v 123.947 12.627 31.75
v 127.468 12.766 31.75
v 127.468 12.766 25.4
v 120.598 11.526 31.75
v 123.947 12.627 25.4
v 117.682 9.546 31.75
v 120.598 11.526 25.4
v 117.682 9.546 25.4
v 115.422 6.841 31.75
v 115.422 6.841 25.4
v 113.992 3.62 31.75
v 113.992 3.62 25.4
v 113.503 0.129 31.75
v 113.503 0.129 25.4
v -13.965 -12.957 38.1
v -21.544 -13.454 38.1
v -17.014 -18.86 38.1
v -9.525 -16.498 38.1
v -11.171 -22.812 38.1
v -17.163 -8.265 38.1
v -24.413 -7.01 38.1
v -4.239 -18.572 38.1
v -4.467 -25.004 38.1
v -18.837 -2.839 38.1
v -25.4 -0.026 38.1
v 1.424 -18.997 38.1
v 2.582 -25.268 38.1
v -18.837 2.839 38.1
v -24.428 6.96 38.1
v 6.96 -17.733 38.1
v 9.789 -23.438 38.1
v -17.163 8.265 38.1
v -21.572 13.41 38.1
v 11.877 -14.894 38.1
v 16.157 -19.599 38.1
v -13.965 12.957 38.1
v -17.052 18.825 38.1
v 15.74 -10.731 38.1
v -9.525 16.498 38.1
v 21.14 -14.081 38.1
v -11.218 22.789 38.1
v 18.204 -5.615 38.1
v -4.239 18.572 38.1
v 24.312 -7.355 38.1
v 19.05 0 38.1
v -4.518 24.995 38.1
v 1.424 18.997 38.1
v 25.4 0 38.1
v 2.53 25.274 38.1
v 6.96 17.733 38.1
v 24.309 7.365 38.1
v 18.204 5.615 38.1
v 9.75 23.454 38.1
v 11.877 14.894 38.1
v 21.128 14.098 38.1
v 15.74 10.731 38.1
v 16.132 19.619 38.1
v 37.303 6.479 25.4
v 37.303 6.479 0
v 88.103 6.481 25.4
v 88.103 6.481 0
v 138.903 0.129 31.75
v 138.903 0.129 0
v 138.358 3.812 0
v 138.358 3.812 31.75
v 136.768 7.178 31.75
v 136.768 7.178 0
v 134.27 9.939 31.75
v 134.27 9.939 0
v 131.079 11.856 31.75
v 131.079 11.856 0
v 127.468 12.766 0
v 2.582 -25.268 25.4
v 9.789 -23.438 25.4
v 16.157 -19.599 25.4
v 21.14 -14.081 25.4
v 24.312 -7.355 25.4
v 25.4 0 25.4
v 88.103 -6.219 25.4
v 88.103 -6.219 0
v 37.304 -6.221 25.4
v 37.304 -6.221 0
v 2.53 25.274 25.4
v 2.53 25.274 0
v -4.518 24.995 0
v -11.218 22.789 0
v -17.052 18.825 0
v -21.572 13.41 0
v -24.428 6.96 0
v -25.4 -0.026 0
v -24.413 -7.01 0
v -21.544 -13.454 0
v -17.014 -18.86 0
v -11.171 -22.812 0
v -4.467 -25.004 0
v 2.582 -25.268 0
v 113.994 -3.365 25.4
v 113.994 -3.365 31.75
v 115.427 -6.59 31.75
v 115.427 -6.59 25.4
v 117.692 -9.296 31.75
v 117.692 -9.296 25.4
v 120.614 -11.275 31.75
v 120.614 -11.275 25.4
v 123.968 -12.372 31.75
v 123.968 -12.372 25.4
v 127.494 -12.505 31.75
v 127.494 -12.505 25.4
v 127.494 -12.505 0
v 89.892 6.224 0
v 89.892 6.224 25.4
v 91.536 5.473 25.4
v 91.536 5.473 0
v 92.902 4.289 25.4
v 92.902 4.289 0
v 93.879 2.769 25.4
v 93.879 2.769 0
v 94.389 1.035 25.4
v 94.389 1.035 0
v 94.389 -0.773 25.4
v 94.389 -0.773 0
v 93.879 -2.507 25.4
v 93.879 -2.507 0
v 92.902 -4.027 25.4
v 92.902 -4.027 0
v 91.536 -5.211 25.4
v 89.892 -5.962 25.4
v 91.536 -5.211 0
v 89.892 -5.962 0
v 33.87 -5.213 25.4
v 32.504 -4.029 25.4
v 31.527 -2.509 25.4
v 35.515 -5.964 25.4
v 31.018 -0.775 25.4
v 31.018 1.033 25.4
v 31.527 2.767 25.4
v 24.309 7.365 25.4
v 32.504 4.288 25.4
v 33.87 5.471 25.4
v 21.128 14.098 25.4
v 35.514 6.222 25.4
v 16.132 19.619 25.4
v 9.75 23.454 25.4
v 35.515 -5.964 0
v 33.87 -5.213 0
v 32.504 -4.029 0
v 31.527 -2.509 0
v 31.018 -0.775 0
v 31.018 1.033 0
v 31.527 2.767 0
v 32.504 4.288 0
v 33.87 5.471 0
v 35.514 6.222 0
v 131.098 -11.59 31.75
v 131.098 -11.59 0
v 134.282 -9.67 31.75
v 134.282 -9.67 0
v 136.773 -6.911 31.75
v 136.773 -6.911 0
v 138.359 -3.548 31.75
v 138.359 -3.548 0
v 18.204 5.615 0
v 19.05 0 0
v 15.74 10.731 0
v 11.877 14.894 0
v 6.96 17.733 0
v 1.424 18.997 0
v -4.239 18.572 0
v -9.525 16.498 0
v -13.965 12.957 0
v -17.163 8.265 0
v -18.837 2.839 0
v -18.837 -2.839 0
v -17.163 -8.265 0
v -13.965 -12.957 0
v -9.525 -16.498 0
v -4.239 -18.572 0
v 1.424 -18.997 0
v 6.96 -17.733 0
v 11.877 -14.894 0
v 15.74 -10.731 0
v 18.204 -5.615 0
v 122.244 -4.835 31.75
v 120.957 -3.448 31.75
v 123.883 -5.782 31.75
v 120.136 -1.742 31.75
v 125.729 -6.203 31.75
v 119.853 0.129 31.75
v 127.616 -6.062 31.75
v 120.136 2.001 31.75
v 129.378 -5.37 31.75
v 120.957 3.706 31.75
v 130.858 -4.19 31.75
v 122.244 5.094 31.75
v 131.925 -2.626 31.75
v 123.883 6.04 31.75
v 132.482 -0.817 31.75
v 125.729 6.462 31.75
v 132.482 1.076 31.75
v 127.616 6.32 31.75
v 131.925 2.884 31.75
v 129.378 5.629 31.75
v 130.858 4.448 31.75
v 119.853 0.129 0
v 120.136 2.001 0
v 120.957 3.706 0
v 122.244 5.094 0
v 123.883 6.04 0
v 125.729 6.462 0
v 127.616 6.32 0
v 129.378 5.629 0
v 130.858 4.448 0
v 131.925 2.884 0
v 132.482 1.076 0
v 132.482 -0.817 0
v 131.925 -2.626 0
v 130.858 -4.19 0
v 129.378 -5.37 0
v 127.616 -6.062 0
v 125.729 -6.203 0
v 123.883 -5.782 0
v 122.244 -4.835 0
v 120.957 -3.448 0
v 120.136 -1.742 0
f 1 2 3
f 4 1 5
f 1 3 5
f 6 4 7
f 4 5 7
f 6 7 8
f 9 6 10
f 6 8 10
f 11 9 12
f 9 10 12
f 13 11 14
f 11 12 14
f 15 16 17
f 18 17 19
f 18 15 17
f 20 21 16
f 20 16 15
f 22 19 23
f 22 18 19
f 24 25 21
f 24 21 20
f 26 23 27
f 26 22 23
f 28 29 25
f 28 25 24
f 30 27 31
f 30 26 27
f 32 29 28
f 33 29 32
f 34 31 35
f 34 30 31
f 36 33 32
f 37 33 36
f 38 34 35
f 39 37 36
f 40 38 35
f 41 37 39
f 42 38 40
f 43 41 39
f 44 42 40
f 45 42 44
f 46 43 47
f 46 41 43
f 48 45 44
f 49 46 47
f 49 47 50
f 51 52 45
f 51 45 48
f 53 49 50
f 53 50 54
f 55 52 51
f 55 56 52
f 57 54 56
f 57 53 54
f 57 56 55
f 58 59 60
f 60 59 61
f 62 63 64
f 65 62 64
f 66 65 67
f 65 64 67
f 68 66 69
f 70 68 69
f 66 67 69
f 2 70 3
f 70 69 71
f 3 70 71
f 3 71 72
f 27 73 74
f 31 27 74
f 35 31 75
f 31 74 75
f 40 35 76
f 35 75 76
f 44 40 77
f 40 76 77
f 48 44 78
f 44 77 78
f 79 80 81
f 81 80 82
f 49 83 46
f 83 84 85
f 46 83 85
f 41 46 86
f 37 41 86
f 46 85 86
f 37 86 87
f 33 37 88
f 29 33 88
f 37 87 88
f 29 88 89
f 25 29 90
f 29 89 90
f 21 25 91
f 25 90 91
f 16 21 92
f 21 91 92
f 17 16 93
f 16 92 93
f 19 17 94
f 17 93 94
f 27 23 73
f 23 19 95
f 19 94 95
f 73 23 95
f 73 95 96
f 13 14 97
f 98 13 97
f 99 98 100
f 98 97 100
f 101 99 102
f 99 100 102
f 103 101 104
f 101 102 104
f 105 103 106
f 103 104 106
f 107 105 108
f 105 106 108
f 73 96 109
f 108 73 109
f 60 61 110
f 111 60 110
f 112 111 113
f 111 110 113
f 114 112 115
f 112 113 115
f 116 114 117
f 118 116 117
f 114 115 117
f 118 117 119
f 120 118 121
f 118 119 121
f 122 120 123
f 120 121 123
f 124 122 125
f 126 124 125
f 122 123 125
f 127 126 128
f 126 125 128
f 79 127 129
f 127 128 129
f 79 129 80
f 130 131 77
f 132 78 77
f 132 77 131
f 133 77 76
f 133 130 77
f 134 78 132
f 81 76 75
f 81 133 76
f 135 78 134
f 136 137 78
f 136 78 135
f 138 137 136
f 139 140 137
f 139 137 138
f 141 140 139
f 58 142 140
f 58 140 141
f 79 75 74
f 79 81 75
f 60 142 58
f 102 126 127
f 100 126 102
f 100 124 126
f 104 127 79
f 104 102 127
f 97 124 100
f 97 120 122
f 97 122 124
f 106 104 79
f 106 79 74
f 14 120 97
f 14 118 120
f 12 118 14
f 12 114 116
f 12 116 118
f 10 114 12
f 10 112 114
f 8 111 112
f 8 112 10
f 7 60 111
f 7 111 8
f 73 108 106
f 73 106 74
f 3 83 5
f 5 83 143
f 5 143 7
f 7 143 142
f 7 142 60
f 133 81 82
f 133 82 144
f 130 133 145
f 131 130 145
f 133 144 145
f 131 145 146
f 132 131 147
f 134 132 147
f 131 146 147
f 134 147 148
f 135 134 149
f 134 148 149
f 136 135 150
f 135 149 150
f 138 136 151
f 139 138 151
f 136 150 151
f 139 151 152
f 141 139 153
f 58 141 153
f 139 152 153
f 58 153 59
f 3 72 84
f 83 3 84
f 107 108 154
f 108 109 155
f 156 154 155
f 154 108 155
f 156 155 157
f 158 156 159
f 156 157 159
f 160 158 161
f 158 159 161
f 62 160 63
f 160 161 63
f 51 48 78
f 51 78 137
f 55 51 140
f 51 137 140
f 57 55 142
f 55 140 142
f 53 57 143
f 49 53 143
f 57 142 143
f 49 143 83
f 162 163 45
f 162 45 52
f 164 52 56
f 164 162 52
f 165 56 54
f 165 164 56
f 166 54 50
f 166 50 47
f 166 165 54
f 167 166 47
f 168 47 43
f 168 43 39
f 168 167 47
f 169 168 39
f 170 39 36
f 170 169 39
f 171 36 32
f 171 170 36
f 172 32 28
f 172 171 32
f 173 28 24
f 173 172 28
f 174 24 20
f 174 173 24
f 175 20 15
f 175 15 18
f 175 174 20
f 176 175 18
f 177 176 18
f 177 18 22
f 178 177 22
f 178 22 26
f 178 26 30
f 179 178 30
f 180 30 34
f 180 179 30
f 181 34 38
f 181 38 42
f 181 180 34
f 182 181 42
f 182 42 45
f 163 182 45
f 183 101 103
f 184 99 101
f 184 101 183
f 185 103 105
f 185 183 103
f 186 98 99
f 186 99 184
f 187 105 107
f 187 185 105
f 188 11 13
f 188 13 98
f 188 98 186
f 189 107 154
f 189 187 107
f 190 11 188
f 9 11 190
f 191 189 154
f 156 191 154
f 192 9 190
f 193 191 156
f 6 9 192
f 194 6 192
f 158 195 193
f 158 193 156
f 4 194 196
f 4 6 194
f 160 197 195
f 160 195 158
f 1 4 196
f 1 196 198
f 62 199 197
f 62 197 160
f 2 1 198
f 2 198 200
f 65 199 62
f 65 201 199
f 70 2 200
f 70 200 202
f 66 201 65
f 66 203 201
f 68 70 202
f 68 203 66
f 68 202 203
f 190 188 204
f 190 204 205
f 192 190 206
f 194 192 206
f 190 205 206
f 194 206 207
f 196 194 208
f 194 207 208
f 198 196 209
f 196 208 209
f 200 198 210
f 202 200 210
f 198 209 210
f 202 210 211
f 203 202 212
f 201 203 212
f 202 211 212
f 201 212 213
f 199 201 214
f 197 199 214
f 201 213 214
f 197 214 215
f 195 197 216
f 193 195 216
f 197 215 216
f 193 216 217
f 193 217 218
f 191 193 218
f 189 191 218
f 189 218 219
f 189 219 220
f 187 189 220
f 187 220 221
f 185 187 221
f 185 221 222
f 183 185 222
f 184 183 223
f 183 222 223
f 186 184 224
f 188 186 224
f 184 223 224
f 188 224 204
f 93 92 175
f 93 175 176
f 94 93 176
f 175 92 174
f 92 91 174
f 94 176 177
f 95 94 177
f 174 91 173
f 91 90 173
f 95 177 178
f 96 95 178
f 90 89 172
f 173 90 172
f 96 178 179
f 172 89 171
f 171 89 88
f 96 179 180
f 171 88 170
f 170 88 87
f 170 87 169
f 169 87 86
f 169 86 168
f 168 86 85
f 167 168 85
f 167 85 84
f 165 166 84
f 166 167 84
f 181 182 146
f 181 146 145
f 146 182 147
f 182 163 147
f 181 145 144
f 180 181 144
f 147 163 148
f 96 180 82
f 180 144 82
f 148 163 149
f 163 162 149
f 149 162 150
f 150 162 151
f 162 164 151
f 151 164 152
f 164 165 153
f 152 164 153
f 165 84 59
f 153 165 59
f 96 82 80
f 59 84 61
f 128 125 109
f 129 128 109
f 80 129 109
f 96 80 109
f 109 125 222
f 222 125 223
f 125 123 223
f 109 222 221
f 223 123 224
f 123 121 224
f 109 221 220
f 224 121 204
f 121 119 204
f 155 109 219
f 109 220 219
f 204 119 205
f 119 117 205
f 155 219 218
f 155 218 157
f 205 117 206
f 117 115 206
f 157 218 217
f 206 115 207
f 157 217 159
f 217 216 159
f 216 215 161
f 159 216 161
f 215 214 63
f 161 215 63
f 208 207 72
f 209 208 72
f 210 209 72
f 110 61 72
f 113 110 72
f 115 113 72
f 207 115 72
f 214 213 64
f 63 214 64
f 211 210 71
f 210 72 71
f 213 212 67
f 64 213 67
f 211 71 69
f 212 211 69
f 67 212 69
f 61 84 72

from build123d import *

# Parameters (mm, degrees)
F0_R     = 19.05
F1_DEPTH = 38.1
F2_DEPTH = 25.4
F3_DEPTH = 31.75


with BuildPart() as f1:
    # F0 (on Top) → F1 (new body)
    with BuildSketch(Plane.XY):
        with BuildLine():
            ThreePointArc((2.581912, -25.268433), (18.851268, -17.023211), (25.4, 0))
            ThreePointArc((25.4, 0), (18.833823, 17.042509), (2.530148, 25.273669))
            ThreePointArc((2.530148, 25.273669), (-25.399987, -0.026014), (2.581912, -25.268433))
        make_face()
        Circle(F0_R, mode=Mode.SUBTRACT)
    extrude(amount=F1_DEPTH)

    # F0 (on Top) → F2 (join)
    with BuildSketch(Plane.XY):
        with BuildLine():
            ThreePointArc((2.530148, 25.273669), (18.833823, 17.042509), (25.4, 0))
            ThreePointArc((25.4, 0), (18.851268, -17.023211), (2.581912, -25.268433))
            Line((2.581912, -25.268433), (127.494344, -12.504961))
            ThreePointArc((127.494344, -12.504961), (117.691782, -9.296378), (113.503388, 0.129256))
            ThreePointArc((113.503388, 0.129256), (117.682133, 9.546167), (127.468462, 12.76609))
            Line((127.468462, 12.76609), (2.530148, 25.273669))
        make_face()
        with BuildLine():
            ThreePointArc((37.3036, -6.220744), (30.953388, 0.12915), (37.303388, 6.479256))
            Line((37.303388, 6.479256), (88.103176, 6.480948))
            ThreePointArc((88.103176, 6.480948), (94.453176, 0.131054), (88.103388, -6.219052))
            Line((88.103388, -6.219052), (37.3036, -6.220744))
        make_face(mode=Mode.SUBTRACT)
    extrude(amount=F2_DEPTH)

    # F0 (on Top) → F3 (join)
    with BuildSketch(Plane.XY):
        with BuildLine():
            ThreePointArc((138.903388, 0.129256), (135.620299, 8.65051), (127.468462, 12.76609))
            ThreePointArc((127.468462, 12.76609), (117.682133, 9.546167), (113.503388, 0.129256))
            ThreePointArc((113.503388, 0.129256), (117.691782, -9.296378), (127.494344, -12.504961))
            ThreePointArc((127.494344, -12.504961), (135.629022, -8.38235), (138.903388, 0.129256))
        make_face()
        with BuildLine():
            ThreePointArc((132.553388, 0.129256), (126.203388, -6.220744), (119.853388, 0.129256))
            ThreePointArc((119.853388, 0.129256), (126.203388, 6.479256), (132.553388, 0.129256))
        make_face(mode=Mode.SUBTRACT)
    extrude(amount=F3_DEPTH)


solid = f1.part
